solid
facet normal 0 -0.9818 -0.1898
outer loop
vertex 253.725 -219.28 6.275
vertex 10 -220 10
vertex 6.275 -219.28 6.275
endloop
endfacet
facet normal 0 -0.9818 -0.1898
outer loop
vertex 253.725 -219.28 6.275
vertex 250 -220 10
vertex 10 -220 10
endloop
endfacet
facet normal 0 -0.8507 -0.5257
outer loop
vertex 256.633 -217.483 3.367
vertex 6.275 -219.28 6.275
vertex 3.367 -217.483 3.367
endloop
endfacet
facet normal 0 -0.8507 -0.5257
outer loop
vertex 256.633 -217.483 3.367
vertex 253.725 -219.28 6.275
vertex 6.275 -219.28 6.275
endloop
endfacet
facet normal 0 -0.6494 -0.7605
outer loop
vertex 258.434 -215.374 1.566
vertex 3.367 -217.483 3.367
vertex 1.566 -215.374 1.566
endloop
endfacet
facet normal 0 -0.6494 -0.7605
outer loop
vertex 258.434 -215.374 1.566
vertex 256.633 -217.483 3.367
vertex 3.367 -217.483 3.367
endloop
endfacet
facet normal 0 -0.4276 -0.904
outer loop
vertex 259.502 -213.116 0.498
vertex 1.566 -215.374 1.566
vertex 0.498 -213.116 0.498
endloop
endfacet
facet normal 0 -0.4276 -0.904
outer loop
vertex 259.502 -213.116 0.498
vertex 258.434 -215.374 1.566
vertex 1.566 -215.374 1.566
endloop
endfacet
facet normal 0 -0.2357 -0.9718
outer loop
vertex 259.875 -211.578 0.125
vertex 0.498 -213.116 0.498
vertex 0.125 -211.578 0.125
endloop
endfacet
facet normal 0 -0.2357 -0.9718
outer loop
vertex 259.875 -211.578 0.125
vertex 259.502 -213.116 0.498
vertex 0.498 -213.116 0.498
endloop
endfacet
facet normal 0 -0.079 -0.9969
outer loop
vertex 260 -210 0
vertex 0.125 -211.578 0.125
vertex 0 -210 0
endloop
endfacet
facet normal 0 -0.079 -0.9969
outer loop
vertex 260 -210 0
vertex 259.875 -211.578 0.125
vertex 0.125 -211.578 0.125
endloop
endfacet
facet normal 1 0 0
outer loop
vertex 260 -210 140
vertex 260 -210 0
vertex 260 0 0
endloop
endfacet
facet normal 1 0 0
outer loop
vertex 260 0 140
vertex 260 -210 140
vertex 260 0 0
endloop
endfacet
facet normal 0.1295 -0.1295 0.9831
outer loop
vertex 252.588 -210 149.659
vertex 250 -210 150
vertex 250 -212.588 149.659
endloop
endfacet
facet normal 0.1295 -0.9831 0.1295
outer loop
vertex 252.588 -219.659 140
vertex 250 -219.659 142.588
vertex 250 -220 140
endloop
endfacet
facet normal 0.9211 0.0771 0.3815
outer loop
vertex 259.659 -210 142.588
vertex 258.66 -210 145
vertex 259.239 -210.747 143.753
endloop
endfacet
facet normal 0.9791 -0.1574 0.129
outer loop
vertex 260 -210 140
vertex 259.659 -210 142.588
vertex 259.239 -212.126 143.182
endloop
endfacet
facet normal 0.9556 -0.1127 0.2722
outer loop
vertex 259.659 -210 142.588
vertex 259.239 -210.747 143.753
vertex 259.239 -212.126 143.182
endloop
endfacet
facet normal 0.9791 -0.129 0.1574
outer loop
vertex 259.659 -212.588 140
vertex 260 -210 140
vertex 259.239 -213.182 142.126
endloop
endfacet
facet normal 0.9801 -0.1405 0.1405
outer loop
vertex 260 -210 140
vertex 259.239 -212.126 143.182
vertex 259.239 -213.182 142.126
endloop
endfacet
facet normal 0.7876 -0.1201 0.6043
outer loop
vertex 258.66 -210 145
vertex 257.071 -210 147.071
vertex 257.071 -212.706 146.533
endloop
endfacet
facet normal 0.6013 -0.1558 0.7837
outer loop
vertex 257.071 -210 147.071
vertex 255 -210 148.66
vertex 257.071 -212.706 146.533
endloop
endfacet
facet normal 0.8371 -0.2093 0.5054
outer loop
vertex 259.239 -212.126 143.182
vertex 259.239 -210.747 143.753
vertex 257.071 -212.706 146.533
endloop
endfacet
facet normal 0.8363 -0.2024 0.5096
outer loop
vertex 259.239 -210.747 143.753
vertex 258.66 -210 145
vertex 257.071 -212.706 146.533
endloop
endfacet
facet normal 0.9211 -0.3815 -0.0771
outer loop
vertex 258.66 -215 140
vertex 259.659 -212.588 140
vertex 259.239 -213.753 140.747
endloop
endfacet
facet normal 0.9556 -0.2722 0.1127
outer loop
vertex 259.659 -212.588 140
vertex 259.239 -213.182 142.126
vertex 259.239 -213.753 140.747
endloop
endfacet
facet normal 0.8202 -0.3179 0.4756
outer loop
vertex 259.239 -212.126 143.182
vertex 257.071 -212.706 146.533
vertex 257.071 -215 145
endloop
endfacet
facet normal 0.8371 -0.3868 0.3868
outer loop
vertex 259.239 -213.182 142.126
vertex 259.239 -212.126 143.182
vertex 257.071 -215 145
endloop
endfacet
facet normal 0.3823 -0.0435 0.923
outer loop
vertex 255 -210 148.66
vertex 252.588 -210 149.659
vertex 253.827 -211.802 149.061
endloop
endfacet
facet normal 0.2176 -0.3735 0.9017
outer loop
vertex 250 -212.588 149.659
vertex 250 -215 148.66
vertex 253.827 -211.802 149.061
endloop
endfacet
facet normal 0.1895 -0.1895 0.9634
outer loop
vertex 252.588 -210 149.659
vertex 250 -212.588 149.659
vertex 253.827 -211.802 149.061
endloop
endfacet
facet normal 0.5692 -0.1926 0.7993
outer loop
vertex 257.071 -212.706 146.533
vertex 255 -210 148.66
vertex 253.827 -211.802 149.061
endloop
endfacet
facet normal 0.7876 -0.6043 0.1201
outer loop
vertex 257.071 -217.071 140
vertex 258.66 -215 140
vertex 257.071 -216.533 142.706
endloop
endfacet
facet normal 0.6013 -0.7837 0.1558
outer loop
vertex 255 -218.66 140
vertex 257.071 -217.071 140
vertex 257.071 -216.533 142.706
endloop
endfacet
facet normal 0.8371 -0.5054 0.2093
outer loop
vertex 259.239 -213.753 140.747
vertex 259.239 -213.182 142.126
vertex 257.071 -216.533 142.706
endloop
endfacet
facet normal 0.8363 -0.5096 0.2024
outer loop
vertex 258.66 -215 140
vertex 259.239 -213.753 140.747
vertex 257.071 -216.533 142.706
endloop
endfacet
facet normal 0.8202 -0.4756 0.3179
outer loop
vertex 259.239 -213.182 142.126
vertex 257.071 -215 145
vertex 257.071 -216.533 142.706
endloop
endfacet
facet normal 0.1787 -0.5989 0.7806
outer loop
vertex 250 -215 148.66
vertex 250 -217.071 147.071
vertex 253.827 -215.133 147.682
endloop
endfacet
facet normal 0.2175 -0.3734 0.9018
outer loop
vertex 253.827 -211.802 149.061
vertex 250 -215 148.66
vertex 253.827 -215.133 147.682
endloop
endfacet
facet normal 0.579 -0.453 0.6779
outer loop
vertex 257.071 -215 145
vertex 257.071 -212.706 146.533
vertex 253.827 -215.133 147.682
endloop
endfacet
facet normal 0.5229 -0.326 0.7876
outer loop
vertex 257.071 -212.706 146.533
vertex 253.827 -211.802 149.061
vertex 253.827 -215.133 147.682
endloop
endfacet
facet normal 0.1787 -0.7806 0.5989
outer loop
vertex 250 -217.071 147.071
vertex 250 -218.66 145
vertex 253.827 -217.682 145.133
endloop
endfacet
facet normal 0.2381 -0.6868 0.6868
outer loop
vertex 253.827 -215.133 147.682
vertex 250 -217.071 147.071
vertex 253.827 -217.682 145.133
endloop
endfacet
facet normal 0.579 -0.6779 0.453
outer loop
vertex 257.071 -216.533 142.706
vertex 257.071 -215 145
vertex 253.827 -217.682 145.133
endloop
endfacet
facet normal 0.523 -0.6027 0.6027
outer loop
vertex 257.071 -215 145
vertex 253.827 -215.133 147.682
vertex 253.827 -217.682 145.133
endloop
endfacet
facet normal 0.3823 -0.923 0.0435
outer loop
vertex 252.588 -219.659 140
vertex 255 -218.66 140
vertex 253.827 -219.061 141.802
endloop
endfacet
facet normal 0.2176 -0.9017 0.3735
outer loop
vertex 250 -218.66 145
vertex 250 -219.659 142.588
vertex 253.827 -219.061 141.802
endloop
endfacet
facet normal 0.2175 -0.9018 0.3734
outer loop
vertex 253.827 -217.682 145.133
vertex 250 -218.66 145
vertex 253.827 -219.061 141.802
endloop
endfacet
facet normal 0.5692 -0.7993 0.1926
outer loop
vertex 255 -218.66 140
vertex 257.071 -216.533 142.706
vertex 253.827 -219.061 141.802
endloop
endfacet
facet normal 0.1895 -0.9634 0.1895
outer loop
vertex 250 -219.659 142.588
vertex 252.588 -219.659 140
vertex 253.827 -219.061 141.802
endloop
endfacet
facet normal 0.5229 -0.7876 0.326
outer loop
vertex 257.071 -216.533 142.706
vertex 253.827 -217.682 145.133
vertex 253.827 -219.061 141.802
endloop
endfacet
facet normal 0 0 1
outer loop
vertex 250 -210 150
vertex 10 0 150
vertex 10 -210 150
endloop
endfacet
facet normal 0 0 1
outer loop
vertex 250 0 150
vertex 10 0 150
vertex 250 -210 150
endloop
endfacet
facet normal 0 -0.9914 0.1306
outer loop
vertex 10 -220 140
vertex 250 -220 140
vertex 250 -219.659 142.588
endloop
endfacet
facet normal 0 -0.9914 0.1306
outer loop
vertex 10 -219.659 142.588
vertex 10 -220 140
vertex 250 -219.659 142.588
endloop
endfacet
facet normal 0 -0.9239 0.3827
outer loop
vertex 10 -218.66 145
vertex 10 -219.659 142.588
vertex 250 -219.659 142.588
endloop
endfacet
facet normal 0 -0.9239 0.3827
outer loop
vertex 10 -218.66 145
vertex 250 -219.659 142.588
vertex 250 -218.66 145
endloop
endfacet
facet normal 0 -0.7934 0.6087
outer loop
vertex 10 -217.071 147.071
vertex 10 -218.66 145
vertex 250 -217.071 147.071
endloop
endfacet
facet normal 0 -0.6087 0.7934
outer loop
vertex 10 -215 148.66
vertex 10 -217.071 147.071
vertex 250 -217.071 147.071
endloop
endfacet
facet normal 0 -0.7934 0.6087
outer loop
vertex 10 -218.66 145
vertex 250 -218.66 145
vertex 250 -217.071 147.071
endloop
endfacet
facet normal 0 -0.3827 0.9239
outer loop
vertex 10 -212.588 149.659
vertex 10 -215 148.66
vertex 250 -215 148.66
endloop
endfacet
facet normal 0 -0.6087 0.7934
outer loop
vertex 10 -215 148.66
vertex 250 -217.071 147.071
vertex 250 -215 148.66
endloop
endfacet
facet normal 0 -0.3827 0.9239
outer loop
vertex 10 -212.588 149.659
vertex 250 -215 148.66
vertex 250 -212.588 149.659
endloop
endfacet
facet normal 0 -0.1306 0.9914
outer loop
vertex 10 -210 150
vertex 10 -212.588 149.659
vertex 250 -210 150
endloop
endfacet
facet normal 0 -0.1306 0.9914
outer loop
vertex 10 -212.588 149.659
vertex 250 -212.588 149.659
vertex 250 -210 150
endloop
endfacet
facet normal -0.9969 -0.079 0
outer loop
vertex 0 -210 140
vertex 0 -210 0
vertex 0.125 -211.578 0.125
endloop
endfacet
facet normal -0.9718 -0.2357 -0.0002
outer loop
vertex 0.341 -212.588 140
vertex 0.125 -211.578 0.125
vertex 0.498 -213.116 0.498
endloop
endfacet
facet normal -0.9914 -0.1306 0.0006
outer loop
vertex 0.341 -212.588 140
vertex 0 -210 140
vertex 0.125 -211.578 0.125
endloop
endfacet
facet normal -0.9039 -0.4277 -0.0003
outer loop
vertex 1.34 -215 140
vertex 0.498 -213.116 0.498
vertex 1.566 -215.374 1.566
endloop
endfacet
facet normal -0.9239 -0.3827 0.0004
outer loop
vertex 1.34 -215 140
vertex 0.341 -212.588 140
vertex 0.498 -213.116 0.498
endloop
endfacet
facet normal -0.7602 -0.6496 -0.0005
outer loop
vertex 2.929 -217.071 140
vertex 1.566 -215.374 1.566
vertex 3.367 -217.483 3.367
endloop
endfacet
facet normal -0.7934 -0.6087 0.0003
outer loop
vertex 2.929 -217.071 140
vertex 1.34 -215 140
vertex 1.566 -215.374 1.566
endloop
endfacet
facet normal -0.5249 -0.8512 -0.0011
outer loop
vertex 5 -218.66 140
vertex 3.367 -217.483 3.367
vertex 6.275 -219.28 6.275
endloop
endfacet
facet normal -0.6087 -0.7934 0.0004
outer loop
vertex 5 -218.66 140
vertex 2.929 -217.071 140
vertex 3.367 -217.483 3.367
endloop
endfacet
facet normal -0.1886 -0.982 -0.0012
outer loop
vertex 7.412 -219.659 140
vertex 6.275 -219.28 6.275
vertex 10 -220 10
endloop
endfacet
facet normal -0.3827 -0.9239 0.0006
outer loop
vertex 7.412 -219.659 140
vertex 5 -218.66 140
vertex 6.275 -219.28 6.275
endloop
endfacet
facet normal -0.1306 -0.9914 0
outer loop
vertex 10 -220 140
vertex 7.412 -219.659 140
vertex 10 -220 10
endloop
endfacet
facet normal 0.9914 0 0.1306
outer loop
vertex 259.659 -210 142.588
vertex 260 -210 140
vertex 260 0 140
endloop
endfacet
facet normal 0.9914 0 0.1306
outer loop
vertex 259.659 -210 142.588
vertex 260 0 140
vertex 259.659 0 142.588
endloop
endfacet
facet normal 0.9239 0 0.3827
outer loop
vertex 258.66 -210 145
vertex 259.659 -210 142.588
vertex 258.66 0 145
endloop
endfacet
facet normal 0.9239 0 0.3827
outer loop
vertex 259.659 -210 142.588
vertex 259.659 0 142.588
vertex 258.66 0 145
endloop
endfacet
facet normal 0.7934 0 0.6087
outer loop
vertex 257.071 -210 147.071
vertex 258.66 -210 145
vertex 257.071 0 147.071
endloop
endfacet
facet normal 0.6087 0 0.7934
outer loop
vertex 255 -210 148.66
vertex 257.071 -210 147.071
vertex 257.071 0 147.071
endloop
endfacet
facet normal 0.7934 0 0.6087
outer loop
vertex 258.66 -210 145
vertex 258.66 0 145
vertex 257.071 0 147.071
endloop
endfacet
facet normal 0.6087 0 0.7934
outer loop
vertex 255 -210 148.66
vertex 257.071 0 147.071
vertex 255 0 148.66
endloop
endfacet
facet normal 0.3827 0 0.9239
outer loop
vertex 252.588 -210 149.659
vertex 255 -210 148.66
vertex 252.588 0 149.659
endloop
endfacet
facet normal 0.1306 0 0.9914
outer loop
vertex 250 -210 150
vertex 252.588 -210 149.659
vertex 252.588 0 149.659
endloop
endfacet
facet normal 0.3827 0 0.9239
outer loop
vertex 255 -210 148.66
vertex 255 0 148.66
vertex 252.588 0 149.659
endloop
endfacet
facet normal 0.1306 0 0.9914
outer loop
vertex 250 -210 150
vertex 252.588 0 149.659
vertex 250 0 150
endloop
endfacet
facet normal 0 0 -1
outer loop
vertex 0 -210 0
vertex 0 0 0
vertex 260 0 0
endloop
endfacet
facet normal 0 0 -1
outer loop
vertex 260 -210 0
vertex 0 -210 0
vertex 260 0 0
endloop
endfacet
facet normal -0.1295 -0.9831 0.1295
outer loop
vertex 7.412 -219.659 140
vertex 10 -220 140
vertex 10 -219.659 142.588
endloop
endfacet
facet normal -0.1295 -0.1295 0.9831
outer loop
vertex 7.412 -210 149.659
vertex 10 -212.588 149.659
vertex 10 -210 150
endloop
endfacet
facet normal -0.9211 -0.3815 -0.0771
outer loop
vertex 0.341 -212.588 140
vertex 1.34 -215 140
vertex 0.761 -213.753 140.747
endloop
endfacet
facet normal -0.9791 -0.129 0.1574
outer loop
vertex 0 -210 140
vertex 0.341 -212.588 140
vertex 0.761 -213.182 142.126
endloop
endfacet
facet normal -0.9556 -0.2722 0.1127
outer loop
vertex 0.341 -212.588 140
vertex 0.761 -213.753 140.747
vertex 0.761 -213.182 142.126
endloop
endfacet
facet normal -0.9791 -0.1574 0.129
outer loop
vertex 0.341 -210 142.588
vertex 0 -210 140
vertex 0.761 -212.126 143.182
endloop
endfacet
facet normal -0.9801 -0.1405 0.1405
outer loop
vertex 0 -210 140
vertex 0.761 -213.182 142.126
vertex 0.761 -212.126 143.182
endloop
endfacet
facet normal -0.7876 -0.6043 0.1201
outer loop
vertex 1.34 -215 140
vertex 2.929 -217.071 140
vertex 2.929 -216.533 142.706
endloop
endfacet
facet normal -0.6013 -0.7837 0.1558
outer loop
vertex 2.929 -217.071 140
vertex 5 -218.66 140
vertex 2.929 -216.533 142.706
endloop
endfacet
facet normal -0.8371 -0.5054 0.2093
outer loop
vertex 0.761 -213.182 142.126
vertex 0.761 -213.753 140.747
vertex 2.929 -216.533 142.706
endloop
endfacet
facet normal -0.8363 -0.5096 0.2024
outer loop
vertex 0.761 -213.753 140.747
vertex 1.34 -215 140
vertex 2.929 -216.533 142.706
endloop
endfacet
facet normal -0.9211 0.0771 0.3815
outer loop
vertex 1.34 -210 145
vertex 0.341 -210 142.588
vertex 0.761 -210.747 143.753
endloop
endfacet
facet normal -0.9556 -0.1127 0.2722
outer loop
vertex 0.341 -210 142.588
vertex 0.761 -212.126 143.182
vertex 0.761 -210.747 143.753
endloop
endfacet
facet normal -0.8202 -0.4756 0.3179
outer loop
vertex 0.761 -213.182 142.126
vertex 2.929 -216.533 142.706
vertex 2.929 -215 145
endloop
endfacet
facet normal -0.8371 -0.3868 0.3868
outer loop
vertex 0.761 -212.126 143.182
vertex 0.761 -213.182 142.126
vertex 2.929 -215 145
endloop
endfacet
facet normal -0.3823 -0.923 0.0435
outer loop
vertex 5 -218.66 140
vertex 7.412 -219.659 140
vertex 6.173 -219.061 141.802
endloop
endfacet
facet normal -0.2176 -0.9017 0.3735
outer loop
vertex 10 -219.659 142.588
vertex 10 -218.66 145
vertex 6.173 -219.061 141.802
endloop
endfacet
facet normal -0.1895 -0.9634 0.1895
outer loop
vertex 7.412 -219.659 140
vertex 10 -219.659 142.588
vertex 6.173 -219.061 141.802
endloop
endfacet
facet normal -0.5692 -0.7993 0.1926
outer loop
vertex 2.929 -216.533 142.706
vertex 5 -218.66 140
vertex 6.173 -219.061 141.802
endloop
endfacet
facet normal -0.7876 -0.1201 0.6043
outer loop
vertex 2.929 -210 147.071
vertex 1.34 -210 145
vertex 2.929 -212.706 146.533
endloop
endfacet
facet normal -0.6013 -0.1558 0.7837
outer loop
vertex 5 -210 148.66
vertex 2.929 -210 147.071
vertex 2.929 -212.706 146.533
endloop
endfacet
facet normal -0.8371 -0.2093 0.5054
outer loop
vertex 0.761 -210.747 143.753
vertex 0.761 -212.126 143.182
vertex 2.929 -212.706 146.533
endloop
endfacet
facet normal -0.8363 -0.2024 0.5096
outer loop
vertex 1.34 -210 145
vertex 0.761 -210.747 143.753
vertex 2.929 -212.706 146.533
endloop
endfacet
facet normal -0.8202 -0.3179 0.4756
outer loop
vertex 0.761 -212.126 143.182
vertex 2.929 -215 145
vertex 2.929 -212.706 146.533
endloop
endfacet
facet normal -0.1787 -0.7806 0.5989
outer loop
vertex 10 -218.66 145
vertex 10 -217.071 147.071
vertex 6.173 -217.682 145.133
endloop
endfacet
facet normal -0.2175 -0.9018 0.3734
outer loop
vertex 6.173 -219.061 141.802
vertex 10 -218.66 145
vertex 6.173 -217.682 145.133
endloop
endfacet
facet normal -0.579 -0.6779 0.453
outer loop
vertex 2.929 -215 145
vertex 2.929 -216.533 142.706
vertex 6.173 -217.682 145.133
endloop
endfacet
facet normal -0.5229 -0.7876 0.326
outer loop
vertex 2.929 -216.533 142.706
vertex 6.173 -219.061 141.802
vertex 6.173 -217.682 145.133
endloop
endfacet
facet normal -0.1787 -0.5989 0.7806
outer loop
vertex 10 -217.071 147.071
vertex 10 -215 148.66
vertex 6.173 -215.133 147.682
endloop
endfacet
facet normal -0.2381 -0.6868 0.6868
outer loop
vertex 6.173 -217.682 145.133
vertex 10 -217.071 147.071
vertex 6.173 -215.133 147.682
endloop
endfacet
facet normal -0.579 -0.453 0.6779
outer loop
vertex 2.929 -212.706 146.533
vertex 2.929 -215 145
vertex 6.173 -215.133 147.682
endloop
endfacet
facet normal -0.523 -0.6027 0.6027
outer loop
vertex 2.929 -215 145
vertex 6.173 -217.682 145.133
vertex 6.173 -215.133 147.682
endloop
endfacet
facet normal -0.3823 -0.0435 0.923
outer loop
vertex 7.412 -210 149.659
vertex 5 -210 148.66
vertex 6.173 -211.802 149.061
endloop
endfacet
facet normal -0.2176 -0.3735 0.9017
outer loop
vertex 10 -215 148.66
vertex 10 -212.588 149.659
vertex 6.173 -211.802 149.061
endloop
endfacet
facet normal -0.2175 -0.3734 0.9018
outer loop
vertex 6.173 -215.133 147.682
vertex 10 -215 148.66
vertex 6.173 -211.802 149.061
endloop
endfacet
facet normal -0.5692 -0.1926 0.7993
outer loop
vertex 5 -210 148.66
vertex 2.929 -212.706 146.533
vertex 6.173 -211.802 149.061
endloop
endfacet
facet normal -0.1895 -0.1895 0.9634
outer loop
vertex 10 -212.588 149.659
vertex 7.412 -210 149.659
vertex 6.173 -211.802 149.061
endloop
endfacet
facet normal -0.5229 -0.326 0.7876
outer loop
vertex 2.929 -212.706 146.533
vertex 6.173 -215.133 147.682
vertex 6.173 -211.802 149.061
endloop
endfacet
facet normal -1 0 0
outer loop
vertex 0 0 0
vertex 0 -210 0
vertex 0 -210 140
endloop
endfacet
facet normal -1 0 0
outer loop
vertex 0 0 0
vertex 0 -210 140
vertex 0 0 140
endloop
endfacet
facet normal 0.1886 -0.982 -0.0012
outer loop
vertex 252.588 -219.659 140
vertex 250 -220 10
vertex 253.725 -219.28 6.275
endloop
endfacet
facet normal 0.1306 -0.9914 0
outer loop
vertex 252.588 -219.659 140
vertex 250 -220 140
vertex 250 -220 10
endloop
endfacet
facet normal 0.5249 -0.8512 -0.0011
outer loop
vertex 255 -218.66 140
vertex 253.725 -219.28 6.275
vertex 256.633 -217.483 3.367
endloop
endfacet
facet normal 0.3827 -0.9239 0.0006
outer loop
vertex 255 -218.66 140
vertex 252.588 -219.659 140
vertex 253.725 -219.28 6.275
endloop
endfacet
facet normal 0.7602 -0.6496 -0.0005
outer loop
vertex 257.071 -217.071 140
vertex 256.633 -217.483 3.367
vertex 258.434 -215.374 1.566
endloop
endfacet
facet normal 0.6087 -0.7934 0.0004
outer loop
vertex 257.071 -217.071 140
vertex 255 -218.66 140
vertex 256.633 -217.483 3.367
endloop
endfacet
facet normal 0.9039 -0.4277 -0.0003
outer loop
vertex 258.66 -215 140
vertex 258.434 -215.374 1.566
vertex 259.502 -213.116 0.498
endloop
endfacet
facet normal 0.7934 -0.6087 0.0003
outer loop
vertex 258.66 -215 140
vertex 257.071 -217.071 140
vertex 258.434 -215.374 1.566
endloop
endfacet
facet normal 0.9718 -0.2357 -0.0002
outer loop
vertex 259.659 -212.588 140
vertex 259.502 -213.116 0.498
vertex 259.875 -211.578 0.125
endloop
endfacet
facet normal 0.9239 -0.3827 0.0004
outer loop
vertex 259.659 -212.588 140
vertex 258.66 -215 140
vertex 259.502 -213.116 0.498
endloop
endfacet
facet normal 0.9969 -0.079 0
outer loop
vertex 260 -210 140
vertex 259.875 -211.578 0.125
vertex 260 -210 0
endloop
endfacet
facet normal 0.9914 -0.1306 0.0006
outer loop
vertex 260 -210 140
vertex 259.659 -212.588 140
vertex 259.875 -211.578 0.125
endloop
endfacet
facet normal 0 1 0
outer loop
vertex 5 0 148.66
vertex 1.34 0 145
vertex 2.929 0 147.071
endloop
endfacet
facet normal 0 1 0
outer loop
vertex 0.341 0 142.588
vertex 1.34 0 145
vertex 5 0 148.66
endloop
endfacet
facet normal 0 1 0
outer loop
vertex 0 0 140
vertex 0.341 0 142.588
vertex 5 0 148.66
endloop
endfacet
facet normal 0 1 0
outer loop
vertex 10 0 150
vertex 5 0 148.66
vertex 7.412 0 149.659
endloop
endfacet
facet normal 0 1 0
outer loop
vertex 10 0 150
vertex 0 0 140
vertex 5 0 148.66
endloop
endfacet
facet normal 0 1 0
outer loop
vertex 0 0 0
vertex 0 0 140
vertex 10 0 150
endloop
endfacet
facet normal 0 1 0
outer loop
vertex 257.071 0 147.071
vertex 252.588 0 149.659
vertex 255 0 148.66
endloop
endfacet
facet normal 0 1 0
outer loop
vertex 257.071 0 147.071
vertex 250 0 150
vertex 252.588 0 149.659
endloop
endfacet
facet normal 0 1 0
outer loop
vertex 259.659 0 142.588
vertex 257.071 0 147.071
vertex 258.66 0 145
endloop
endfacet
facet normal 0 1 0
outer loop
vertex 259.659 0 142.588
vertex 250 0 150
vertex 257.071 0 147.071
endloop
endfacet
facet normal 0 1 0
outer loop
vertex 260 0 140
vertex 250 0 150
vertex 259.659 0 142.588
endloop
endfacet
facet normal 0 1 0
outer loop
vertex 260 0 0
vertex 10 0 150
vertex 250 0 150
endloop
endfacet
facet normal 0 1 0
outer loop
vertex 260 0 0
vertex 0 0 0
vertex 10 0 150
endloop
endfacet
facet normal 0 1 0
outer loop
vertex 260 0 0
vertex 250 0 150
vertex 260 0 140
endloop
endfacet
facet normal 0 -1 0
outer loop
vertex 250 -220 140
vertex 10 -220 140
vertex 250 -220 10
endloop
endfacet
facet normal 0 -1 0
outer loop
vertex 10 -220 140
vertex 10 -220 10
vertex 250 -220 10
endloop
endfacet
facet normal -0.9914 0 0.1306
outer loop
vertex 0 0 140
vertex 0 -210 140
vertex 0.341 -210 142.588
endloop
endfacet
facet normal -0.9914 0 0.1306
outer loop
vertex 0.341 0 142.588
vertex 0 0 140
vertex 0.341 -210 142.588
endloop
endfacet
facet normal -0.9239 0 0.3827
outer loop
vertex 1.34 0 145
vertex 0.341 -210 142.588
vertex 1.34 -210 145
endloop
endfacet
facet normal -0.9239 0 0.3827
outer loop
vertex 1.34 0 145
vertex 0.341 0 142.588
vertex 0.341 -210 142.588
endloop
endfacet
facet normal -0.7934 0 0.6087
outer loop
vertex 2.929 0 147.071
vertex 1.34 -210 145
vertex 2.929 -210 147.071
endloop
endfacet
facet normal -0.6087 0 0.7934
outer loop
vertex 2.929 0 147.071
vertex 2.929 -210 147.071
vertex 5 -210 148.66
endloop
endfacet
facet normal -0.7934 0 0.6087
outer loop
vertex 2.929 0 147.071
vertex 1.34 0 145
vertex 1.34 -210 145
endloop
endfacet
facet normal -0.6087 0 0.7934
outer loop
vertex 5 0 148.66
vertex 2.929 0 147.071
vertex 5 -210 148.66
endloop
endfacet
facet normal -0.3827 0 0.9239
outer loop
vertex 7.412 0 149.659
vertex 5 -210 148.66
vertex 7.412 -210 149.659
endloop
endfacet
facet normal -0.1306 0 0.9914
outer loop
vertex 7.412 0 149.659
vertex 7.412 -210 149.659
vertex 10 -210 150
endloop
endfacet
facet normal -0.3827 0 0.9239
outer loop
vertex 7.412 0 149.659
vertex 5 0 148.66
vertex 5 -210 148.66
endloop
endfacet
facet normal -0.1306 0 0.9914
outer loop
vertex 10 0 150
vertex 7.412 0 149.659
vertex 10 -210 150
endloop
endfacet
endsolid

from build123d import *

# Parameters (mm, degrees)
SKETCH2_W           = 260
SKETCH2_H           = 220
BOSS_EXTRUDE1_DEPTH = 150
FILLET1_R           = 10


with BuildPart() as part:
    # Sketch2 → Boss-Extrude1 (new body)
    with BuildSketch(Plane.XY):
        with Locations((130, -110)):
            Rectangle(SKETCH2_W, SKETCH2_H)
    extrude(amount=BOSS_EXTRUDE1_DEPTH)

    # Fillet1
    fillet1_edges = [part.edges().sort_by_distance(p)[0] for p in [
        (130, -220, 150),
        (260, -110, 150),
        (130, -220, 0),
        (260, -220, 75),
        (0, -220, 75),
        (0, -110, 150),
    ]]
    fillet(fillet1_edges, radius=FILLET1_R)


solid = part.part
